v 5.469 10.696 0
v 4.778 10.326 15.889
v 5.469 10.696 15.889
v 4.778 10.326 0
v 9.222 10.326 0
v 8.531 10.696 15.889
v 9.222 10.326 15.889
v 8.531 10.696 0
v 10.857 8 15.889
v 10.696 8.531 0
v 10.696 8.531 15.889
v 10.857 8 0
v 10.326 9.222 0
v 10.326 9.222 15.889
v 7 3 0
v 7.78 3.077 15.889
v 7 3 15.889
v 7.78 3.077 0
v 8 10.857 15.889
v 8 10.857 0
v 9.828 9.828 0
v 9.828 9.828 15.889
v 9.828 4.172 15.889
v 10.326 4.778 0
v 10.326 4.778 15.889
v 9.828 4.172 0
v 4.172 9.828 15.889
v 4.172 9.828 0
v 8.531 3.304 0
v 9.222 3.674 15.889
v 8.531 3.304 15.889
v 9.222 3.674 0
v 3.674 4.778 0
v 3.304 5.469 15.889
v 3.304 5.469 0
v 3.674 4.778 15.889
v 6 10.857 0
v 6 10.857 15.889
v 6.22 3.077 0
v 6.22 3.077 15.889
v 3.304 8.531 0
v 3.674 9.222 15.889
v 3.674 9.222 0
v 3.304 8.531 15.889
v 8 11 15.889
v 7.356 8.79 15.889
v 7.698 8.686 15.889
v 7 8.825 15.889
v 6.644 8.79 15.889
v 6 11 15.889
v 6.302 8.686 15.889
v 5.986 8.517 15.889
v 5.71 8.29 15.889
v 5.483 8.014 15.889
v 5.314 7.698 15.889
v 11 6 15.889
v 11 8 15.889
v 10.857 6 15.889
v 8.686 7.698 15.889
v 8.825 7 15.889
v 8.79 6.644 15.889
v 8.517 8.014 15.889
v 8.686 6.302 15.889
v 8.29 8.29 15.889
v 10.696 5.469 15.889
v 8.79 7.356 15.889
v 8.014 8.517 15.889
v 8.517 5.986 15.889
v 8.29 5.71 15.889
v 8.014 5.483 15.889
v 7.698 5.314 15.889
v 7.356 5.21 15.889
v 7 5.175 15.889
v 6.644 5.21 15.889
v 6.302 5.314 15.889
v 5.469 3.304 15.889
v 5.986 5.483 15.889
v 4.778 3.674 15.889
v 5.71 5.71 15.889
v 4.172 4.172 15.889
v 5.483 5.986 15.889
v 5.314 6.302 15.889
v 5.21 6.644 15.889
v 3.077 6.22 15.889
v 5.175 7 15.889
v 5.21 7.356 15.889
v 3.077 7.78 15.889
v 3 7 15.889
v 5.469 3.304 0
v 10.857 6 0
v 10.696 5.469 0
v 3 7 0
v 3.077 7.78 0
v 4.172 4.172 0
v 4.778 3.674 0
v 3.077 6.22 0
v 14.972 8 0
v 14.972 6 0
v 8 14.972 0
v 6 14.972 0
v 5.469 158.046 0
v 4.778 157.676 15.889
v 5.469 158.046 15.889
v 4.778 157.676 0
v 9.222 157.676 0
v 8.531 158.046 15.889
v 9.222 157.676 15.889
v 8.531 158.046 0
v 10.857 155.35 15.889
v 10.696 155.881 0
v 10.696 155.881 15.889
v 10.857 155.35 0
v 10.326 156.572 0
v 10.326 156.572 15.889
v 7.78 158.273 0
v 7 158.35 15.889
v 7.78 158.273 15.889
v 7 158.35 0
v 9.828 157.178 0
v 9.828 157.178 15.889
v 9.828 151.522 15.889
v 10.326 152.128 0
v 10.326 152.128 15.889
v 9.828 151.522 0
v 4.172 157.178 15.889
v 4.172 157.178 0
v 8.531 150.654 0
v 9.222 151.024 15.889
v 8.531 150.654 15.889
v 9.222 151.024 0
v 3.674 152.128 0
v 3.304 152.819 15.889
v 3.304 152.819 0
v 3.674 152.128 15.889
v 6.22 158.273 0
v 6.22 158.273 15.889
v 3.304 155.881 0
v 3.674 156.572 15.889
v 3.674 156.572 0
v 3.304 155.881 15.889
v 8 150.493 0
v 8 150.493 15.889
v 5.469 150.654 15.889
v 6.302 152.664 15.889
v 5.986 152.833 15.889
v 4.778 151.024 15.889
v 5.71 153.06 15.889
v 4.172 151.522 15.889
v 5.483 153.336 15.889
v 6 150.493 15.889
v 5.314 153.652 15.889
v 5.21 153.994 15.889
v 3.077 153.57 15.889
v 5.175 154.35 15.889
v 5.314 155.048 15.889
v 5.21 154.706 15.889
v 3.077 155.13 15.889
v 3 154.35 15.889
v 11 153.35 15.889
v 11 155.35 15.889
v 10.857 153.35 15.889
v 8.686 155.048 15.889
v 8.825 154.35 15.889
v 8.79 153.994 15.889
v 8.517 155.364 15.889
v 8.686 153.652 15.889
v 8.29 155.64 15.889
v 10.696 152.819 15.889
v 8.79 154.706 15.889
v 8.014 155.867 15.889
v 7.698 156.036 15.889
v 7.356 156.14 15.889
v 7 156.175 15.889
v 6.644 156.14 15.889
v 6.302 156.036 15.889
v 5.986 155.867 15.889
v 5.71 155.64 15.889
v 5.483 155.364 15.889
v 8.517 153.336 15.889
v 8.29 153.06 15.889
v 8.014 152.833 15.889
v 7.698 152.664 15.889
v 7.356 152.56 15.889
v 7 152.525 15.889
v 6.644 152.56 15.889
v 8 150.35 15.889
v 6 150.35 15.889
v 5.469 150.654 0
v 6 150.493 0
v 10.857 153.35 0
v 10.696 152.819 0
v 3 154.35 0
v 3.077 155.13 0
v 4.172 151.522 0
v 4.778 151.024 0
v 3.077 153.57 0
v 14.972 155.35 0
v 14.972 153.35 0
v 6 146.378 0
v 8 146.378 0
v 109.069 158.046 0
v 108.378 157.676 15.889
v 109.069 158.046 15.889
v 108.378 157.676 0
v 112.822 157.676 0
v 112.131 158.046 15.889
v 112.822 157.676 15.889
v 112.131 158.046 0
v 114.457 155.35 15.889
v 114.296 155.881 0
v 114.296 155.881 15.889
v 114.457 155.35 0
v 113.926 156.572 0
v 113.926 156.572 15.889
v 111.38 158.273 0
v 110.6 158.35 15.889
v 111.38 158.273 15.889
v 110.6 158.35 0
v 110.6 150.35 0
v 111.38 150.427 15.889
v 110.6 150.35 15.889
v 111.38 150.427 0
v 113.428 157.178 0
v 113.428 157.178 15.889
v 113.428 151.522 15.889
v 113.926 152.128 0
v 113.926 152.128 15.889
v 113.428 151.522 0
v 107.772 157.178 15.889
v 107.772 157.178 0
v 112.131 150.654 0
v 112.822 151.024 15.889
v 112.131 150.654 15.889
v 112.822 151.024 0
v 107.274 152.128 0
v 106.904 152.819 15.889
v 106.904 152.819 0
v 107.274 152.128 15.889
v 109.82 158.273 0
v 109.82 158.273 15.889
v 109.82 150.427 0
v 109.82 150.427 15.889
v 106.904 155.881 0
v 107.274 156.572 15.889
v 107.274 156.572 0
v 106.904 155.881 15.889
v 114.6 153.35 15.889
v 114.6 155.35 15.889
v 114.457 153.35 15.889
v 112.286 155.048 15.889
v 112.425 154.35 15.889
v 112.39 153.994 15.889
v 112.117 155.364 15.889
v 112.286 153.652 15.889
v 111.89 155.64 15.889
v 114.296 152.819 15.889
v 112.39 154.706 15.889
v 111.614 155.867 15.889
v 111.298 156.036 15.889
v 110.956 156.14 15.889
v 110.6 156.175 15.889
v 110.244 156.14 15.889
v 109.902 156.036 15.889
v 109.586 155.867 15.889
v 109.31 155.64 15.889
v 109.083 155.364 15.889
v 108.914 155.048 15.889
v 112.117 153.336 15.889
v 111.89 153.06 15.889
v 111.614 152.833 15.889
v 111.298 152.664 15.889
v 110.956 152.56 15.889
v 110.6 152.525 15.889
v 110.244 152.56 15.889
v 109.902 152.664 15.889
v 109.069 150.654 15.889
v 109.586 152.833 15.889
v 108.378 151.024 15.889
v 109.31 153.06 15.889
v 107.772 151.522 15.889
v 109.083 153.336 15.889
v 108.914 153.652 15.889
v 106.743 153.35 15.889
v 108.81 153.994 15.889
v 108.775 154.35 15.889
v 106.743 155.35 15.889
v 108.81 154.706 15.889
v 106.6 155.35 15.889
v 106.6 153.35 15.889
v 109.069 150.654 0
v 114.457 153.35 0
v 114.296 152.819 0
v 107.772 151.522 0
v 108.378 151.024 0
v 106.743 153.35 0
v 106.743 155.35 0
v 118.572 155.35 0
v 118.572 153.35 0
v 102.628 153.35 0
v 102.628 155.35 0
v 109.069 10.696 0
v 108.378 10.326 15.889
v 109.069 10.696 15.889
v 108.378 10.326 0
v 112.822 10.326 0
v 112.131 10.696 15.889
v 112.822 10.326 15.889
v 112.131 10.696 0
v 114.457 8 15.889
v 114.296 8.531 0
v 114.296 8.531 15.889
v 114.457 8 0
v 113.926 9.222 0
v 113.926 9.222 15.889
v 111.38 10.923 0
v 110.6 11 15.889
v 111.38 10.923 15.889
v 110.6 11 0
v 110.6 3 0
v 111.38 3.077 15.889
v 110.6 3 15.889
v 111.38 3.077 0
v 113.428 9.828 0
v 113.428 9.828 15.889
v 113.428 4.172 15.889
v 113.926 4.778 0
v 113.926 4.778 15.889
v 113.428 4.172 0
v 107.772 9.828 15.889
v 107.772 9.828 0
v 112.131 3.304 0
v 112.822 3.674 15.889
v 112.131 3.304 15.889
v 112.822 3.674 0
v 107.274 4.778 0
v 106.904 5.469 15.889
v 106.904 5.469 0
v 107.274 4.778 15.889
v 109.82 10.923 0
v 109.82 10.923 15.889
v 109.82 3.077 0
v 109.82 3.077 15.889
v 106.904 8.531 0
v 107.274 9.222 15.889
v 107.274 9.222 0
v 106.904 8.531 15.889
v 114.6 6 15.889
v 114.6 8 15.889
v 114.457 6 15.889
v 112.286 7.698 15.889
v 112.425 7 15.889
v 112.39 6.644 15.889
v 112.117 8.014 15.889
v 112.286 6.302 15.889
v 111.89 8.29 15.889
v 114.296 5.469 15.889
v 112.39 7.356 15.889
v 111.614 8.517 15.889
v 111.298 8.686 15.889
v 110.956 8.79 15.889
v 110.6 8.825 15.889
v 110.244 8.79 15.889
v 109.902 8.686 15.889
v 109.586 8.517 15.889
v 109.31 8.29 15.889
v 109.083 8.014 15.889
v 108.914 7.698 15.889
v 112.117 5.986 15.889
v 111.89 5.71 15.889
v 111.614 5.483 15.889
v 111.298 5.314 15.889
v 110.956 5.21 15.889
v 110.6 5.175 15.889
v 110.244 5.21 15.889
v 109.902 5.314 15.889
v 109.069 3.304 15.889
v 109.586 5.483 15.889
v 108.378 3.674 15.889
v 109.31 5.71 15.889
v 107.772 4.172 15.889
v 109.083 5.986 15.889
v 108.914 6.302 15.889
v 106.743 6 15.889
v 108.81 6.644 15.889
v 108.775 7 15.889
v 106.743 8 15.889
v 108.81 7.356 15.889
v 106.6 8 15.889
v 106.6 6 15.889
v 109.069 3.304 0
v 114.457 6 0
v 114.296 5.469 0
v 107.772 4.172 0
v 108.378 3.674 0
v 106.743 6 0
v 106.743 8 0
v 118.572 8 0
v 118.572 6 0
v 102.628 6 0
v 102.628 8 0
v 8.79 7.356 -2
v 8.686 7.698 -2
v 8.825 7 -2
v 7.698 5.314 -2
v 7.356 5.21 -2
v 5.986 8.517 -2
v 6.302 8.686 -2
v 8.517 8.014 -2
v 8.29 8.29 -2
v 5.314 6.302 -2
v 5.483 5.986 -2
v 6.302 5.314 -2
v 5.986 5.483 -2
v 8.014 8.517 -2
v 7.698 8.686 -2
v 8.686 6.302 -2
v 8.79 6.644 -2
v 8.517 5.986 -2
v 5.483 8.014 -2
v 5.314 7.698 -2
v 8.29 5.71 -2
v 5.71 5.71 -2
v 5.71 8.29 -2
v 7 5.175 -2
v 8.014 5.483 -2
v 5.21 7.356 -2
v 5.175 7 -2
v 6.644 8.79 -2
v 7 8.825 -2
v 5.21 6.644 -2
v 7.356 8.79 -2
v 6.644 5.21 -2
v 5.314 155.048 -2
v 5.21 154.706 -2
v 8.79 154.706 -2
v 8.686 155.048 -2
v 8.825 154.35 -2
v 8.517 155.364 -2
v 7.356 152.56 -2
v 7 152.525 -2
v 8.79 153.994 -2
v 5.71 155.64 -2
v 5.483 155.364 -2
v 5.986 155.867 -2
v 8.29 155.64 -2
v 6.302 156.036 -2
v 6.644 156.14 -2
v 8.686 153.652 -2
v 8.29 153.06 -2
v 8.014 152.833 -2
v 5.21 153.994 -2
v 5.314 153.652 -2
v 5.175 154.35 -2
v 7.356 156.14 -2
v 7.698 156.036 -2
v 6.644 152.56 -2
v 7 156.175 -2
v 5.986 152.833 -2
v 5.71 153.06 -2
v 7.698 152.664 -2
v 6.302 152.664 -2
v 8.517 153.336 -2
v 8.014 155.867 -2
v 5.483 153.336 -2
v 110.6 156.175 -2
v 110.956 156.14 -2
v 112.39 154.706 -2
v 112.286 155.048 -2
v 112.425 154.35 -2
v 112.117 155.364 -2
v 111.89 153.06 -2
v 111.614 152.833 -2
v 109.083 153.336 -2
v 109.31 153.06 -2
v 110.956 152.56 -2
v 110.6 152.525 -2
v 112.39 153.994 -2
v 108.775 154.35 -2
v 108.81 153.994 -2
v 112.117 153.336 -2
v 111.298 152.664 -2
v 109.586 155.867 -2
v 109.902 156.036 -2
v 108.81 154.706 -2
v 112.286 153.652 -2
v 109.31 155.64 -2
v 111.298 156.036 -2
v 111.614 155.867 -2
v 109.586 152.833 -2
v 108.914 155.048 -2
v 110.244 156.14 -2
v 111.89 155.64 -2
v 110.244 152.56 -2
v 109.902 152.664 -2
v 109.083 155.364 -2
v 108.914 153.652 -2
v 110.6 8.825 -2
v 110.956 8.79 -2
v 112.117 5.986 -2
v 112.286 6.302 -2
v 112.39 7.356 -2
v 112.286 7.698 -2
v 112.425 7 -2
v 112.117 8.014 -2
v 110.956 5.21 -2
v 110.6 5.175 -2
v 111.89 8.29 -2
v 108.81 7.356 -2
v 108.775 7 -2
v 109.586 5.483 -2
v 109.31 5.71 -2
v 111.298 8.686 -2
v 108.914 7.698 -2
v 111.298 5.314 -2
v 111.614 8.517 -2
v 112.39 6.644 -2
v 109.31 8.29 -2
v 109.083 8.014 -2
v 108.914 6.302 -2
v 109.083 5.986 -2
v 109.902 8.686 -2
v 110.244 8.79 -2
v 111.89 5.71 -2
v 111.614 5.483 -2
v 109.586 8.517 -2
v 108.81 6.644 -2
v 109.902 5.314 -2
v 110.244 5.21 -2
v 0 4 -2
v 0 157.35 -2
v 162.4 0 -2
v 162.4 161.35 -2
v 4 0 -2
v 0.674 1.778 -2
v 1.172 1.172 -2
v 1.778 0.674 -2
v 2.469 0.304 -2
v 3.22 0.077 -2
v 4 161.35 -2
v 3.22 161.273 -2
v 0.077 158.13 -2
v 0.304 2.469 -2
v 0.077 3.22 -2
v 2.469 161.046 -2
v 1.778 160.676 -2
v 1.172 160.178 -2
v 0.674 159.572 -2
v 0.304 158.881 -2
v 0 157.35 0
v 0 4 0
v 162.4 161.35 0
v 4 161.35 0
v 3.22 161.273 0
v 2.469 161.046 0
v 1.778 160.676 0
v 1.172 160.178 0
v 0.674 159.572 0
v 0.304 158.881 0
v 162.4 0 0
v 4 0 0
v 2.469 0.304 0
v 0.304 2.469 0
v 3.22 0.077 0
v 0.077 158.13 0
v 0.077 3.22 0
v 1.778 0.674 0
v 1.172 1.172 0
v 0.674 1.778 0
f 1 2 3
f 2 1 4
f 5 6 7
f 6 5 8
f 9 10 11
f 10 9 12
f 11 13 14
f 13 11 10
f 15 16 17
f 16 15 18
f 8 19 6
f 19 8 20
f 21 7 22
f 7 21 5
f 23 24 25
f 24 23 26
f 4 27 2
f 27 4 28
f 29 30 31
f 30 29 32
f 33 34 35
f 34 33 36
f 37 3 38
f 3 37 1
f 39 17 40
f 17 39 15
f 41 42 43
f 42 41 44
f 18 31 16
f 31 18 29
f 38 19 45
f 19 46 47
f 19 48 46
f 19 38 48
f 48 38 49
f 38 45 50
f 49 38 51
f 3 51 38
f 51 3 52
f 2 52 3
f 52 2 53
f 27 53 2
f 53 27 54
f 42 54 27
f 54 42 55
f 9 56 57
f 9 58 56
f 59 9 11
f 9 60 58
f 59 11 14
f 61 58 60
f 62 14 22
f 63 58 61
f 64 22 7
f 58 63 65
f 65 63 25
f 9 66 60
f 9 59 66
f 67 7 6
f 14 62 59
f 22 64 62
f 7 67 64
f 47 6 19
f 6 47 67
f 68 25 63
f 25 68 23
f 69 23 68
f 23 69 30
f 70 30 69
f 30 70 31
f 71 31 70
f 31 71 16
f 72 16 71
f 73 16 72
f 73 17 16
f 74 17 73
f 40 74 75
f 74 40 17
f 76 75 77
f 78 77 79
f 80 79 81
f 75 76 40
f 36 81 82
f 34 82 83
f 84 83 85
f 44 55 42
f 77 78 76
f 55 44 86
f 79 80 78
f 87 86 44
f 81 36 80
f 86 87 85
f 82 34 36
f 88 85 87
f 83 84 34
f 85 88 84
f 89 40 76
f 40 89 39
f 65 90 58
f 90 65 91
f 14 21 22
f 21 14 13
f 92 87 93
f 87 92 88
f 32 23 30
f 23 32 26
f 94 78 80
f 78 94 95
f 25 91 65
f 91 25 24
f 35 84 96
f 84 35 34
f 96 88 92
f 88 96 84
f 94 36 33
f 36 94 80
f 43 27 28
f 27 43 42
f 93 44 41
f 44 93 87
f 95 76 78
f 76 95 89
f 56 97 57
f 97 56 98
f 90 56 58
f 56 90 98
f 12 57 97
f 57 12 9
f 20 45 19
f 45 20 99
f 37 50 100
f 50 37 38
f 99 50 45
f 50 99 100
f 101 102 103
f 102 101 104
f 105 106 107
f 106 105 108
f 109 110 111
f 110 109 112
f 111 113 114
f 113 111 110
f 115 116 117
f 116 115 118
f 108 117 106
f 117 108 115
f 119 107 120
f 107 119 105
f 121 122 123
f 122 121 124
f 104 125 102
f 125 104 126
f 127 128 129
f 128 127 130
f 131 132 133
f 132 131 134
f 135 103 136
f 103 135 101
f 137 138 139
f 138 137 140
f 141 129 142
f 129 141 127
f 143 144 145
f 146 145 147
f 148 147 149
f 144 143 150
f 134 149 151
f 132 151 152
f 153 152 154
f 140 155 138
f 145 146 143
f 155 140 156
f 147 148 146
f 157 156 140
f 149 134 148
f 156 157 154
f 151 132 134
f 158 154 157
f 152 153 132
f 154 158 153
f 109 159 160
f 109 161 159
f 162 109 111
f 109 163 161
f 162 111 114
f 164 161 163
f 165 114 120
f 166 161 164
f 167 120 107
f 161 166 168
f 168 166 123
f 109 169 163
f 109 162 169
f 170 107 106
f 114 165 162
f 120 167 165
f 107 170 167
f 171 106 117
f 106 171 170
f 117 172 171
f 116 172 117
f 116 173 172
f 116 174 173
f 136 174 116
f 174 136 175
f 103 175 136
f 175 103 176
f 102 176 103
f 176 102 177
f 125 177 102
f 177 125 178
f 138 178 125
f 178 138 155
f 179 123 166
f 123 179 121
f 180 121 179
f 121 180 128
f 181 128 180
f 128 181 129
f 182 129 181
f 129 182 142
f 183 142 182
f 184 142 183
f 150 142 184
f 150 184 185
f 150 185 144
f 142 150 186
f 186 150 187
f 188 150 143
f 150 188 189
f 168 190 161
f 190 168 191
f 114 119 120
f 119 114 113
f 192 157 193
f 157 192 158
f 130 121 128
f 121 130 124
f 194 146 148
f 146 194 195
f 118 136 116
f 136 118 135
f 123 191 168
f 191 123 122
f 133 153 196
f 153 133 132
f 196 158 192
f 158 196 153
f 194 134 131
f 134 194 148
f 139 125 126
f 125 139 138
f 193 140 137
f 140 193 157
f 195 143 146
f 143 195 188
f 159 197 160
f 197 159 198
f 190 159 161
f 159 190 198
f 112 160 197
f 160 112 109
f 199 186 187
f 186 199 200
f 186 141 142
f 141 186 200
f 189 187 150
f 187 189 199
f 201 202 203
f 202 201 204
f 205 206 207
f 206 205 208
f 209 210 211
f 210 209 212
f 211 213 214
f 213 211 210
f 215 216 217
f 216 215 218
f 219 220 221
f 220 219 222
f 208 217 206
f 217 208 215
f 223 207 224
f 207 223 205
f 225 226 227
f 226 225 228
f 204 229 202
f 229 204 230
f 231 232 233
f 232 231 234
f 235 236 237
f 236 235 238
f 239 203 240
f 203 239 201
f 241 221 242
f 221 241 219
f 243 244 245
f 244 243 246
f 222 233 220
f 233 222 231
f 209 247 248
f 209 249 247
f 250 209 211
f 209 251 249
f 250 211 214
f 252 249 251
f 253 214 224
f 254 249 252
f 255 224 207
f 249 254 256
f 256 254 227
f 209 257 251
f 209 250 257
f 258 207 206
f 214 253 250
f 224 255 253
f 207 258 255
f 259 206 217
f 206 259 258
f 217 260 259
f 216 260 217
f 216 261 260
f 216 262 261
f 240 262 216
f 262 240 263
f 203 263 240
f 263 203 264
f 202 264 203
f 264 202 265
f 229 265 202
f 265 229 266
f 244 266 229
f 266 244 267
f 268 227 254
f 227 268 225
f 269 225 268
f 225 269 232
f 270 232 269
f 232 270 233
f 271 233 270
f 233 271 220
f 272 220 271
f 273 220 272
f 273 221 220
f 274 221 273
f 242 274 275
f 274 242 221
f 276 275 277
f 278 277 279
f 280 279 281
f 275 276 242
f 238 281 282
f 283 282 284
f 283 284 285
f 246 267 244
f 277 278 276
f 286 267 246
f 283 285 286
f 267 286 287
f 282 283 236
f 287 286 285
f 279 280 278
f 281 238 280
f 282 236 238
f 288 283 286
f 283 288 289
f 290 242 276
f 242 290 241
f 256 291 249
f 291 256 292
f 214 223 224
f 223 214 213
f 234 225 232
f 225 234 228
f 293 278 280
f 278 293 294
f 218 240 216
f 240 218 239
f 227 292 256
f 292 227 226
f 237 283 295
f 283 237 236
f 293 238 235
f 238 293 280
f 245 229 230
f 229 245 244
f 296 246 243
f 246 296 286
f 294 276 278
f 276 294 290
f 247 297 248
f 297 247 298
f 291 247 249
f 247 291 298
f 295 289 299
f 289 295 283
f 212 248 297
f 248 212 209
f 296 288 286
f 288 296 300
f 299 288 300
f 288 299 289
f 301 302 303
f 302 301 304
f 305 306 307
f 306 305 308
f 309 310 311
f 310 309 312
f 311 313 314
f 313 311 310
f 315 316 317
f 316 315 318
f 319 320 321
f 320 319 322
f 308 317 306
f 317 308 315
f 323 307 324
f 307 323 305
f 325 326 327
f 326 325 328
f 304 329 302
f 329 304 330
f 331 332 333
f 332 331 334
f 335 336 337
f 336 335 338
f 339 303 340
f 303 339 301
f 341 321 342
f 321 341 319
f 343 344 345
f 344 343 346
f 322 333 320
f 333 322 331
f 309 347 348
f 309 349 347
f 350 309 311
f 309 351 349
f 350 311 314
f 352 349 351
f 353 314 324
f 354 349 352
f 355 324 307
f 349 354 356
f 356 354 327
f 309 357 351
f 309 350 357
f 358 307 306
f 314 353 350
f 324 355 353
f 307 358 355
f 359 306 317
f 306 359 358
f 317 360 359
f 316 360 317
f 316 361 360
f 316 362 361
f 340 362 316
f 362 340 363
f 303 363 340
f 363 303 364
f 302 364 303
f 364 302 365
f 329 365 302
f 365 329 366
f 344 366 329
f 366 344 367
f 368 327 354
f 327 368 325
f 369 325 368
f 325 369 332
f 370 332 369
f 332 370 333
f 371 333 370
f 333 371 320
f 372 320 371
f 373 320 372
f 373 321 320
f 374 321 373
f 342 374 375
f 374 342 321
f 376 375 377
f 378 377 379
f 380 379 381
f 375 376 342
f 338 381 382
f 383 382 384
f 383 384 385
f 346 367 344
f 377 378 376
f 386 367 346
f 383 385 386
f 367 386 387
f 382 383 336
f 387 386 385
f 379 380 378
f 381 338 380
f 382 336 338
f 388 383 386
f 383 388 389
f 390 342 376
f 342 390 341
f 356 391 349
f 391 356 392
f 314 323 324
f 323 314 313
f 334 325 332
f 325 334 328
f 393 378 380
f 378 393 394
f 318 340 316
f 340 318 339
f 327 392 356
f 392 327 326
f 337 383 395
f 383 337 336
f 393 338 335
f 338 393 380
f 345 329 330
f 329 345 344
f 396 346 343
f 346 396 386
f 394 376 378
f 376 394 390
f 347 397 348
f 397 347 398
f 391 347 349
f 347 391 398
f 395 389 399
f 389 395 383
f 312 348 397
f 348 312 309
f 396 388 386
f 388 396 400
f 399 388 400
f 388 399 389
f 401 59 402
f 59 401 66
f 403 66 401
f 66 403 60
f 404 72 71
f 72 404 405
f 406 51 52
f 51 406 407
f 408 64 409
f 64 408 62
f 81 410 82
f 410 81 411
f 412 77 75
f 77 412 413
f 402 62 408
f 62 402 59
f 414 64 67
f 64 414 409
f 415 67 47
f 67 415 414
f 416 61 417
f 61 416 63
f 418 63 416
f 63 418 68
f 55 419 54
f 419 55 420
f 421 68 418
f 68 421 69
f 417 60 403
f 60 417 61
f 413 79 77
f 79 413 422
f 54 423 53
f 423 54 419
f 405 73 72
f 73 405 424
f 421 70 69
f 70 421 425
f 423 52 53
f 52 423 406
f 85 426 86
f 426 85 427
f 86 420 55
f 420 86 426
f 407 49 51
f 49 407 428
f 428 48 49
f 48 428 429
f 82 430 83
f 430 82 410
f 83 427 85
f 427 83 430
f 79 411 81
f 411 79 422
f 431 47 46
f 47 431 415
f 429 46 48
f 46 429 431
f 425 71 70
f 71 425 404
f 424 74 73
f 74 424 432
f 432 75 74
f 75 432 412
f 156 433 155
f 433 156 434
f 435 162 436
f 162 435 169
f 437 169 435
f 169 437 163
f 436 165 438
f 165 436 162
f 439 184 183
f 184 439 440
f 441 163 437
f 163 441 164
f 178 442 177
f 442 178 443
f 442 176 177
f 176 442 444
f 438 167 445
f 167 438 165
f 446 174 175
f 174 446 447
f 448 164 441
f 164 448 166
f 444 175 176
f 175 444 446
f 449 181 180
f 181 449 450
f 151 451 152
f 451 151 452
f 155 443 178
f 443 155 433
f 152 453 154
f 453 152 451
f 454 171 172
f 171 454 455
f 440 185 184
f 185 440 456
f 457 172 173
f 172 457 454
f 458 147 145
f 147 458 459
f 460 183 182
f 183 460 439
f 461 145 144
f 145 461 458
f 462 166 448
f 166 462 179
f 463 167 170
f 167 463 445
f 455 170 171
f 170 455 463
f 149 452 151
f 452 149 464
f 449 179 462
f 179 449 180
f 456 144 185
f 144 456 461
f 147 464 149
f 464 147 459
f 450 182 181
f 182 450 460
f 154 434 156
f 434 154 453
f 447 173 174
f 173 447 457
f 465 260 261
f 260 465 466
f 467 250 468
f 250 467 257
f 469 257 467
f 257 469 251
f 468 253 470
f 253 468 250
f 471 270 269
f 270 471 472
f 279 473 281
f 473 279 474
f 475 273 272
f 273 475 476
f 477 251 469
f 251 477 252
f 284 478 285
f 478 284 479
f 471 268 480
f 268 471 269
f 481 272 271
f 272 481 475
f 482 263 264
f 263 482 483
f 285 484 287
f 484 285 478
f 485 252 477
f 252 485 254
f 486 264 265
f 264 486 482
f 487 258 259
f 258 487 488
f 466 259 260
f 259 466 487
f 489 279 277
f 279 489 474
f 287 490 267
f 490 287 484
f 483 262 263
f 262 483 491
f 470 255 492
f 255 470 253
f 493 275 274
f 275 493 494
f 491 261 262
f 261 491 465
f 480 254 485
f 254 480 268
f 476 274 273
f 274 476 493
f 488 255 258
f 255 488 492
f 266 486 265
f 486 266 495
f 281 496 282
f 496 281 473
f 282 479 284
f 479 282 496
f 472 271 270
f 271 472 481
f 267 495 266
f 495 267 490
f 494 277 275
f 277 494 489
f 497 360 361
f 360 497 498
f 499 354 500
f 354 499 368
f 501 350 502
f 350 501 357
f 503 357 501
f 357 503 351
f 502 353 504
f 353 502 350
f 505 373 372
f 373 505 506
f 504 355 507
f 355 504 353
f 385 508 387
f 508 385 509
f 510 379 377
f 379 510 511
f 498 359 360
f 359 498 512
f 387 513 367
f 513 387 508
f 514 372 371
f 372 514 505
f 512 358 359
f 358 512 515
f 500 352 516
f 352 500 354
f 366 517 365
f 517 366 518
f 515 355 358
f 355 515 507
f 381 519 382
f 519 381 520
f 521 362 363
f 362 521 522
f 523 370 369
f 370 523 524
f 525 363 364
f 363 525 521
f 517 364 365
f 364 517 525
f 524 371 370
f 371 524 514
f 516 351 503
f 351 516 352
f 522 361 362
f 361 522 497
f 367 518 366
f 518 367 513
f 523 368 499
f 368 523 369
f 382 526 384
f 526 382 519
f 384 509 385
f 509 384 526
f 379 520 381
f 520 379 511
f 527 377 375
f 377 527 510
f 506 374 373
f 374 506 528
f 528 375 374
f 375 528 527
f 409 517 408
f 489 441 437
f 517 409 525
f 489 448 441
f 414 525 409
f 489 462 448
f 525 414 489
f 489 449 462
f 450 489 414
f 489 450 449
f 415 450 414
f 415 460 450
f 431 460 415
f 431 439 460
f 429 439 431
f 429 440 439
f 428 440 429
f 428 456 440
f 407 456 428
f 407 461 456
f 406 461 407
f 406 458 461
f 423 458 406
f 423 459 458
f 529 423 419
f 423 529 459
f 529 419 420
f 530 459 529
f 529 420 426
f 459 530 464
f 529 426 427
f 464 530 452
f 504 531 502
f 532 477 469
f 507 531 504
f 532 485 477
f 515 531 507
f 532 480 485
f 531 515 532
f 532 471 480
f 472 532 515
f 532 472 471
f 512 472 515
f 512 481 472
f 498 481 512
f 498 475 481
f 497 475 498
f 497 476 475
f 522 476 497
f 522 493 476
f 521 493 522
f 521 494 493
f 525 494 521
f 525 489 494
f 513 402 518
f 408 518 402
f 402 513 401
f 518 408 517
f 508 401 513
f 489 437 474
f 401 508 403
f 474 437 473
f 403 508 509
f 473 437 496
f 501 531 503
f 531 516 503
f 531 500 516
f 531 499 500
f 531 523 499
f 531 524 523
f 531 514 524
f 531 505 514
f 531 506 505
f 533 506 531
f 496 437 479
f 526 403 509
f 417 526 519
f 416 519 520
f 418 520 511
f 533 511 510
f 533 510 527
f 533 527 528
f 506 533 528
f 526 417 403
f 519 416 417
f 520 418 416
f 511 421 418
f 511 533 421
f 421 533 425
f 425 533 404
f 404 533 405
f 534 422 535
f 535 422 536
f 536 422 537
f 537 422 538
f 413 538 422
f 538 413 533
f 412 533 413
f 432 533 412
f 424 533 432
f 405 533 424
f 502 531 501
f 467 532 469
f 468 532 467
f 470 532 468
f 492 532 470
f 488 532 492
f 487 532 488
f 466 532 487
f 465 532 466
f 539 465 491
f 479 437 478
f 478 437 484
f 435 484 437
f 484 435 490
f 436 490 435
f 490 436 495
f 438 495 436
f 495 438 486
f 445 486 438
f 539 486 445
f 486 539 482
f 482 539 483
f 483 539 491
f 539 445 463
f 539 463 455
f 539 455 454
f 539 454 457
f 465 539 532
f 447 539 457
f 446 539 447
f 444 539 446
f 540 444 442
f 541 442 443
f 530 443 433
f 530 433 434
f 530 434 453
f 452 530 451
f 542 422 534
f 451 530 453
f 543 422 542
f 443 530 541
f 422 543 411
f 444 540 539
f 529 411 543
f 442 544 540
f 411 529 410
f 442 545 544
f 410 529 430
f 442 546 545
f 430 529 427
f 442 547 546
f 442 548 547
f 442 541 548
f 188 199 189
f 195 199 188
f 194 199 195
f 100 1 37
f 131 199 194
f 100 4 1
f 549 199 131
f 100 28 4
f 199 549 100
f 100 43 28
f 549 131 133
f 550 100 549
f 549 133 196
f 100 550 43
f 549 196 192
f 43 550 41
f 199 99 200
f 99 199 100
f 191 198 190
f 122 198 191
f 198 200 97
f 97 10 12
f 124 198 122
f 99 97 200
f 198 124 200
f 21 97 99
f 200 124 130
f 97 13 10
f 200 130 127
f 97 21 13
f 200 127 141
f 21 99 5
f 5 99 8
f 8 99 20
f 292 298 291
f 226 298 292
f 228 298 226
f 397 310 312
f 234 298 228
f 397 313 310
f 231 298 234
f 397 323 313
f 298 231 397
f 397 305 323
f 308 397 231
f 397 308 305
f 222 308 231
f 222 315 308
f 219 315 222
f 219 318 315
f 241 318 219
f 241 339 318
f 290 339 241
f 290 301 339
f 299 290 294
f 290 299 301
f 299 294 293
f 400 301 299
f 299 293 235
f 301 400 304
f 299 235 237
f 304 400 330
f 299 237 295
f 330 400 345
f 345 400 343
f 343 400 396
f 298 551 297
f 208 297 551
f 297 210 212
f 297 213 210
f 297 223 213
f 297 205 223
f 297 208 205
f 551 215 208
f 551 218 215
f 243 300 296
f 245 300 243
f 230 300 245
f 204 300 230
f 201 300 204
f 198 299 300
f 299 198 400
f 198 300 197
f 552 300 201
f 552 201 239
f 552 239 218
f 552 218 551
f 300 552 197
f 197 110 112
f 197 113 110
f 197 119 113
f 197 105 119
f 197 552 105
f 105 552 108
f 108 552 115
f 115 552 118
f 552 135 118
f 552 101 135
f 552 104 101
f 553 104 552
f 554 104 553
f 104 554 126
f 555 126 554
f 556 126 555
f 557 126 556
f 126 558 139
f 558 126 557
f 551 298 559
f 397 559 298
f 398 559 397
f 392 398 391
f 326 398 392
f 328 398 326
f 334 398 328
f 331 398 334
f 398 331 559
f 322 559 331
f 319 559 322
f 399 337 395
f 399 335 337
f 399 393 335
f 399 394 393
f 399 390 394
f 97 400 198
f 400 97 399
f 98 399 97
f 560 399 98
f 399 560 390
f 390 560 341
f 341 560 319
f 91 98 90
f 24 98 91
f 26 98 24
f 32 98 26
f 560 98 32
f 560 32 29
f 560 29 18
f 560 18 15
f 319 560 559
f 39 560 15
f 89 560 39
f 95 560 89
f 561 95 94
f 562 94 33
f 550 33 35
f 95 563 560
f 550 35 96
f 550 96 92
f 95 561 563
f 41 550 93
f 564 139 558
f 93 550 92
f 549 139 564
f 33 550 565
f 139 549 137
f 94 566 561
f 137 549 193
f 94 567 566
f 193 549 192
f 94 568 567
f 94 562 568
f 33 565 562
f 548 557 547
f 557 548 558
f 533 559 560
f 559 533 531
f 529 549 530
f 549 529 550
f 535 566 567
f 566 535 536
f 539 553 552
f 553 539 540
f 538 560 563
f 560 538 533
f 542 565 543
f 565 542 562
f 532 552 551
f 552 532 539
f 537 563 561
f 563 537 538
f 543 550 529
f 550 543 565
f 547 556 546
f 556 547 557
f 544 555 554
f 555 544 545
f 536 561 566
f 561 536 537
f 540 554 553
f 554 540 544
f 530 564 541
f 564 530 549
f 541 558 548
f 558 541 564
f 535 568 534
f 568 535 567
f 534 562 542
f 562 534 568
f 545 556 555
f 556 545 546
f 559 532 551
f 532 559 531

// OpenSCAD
// Generated by SolidPython 1.1.3 on 2024-04-18 16:18:07
$fn = 32;


difference() {
	intersection() {
		union() {
			difference() {
				translate(v = [0, 0, 16.4445000000]) {
					translate(v = [0, 147.3500000000, 0]) {
						translate(v = [10, 0, 0]) {
							difference() {
								translate(v = [-3, 0, 0]) {
									translate(v = [0, -140.3500000000, 0]) {
										translate(v = [0, 0, -69.5555000000]) {
											union() {
												translate(v = [0, 0, 0]) {
													translate(v = [0, 0, 0]) {
														union() {
															cylinder(h = 69, r = 4.0000000000);
															rotate(a = 90, v = [1, 0, 0]) {
																linear_extrude(center = true, height = 2) {
																	polygon(paths = [[0, 1, 2, 3]], points = [[0, 0], [0, 69], [4.0000000000, 69], [21.2500000000, 0]]);
																}
															}
															rotate(a = 90, v = [0, 0, 1]) {
																rotate(a = 90, v = [1, 0, 0]) {
																	linear_extrude(center = true, height = 2) {
																		polygon(paths = [[0, 1, 2, 3]], points = [[0, 0], [0, 69], [4.0000000000, 69], [21.2500000000, 0]]);
																	}
																}
															}
														}
													}
												}
												translate(v = [0, 0, 0]) {
													translate(v = [0, 147.3500000000, 0]) {
														union() {
															cylinder(h = 69, r = 4.0000000000);
															rotate(a = 90, v = [1, 0, 0]) {
																linear_extrude(center = true, height = 2) {
																	polygon(paths = [[0, 1, 2, 3]], points = [[0, 0], [0, 69], [4.0000000000, 69], [21.2500000000, 0]]);
																}
															}
															rotate(a = 270, v = [0, 0, 1]) {
																rotate(a = 90, v = [1, 0, 0]) {
																	linear_extrude(center = true, height = 2) {
																		polygon(paths = [[0, 1, 2, 3]], points = [[0, 0], [0, 69], [4.0000000000, 69], [21.2500000000, 0]]);
																	}
																}
															}
														}
													}
												}
												translate(v = [310.8000000000, 0, 0]) {
													translate(v = [0, 147.3500000000, 0]) {
														union() {
															cylinder(h = 69, r = 4.0000000000);
															rotate(a = 180, v = [0, 0, 1]) {
																rotate(a = 90, v = [1, 0, 0]) {
																	linear_extrude(center = true, height = 2) {
																		polygon(paths = [[0, 1, 2, 3]], points = [[0, 0], [0, 69], [4.0000000000, 69], [21.2500000000, 0]]);
																	}
																}
															}
															rotate(a = 270, v = [0, 0, 1]) {
																rotate(a = 90, v = [1, 0, 0]) {
																	linear_extrude(center = true, height = 2) {
																		polygon(paths = [[0, 1, 2, 3]], points = [[0, 0], [0, 69], [4.0000000000, 69], [21.2500000000, 0]]);
																	}
																}
															}
														}
													}
												}
												translate(v = [310.8000000000, 0, 0]) {
													translate(v = [0, 0, 0]) {
														union() {
															cylinder(h = 69, r = 4.0000000000);
															rotate(a = 180, v = [0, 0, 1]) {
																rotate(a = 90, v = [1, 0, 0]) {
																	linear_extrude(center = true, height = 2) {
																		polygon(paths = [[0, 1, 2, 3]], points = [[0, 0], [0, 69], [4.0000000000, 69], [21.2500000000, 0]]);
																	}
																}
															}
															rotate(a = 90, v = [0, 0, 1]) {
																rotate(a = 90, v = [1, 0, 0]) {
																	linear_extrude(center = true, height = 2) {
																		polygon(paths = [[0, 1, 2, 3]], points = [[0, 0], [0, 69], [4.0000000000, 69], [21.2500000000, 0]]);
																	}
																}
															}
														}
													}
												}
												translate(v = [103.6000000000, 0, 0]) {
													translate(v = [0, 147.3500000000, 0]) {
														union() {
															cylinder(h = 69, r = 4.0000000000);
															rotate(a = 90, v = [1, 0, 0]) {
																linear_extrude(center = true, height = 2) {
																	polygon(paths = [[0, 1, 2, 3]], points = [[0, 0], [0, 69], [4.0000000000, 69], [21.2500000000, 0]]);
																}
															}
															rotate(a = 180, v = [0, 0, 1]) {
																rotate(a = 90, v = [1, 0, 0]) {
																	linear_extrude(center = true, height = 2) {
																		polygon(paths = [[0, 1, 2, 3]], points = [[0, 0], [0, 69], [4.0000000000, 69], [21.2500000000, 0]]);
																	}
																}
															}
														}
													}
												}
												translate(v = [103.6000000000, 0, 0]) {
													translate(v = [0, 0, 0]) {
														union() {
															cylinder(h = 69, r = 4.0000000000);
															rotate(a = 90, v = [1, 0, 0]) {
																linear_extrude(center = true, height = 2) {
																	polygon(paths = [[0, 1, 2, 3]], points = [[0, 0], [0, 69], [4.0000000000, 69], [21.2500000000, 0]]);
																}
															}
															rotate(a = 180, v = [0, 0, 1]) {
																rotate(a = 90, v = [1, 0, 0]) {
																	linear_extrude(center = true, height = 2) {
																		polygon(paths = [[0, 1, 2, 3]], points = [[0, 0], [0, 69], [4.0000000000, 69], [21.2500000000, 0]]);
																	}
																}
															}
														}
													}
												}
												translate(v = [207.2000000000, 0, 0]) {
													translate(v = [0, 147.3500000000, 0]) {
														union() {
															cylinder(h = 69, r = 4.0000000000);
															rotate(a = 90, v = [1, 0, 0]) {
																linear_extrude(center = true, height = 2) {
																	polygon(paths = [[0, 1, 2, 3]], points = [[0, 0], [0, 69], [4.0000000000, 69], [21.2500000000, 0]]);
																}
															}
															rotate(a = 180, v = [0, 0, 1]) {
																rotate(a = 90, v = [1, 0, 0]) {
																	linear_extrude(center = true, height = 2) {
																		polygon(paths = [[0, 1, 2, 3]], points = [[0, 0], [0, 69], [4.0000000000, 69], [21.2500000000, 0]]);
																	}
																}
															}
														}
													}
												}
												translate(v = [207.2000000000, 0, 0]) {
													translate(v = [0, 0, 0]) {
														union() {
															cylinder(h = 69, r = 4.0000000000);
															rotate(a = 90, v = [1, 0, 0]) {
																linear_extrude(center = true, height = 2) {
																	polygon(paths = [[0, 1, 2, 3]], points = [[0, 0], [0, 69], [4.0000000000, 69], [21.2500000000, 0]]);
																}
															}
															rotate(a = 180, v = [0, 0, 1]) {
																rotate(a = 90, v = [1, 0, 0]) {
																	linear_extrude(center = true, height = 2) {
																		polygon(paths = [[0, 1, 2, 3]], points = [[0, 0], [0, 69], [4.0000000000, 69], [21.2500000000, 0]]);
																	}
																}
															}
														}
													}
												}
											}
										}
									}
								}
								translate(v = [-3, 0, 0]) {
									translate(v = [0, -140.3500000000, 0]) {
										union() {
											translate(v = [0, 0, 0]) {
												translate(v = [0, 0, 0]) {
													cylinder(center = true, h = 276, r = 1.8250000000);
												}
											}
											translate(v = [0, 0, 0]) {
												translate(v = [0, 147.3500000000, 0]) {
													cylinder(center = true, h = 276, r = 1.8250000000);
												}
											}
											translate(v = [310.8000000000, 0, 0]) {
												translate(v = [0, 147.3500000000, 0]) {
													cylinder(center = true, h = 276, r = 1.8250000000);
												}
											}
											translate(v = [310.8000000000, 0, 0]) {
												translate(v = [0, 0, 0]) {
													cylinder(center = true, h = 276, r = 1.8250000000);
												}
											}
											translate(v = [103.6000000000, 0, 0]) {
												translate(v = [0, 147.3500000000, 0]) {
													cylinder(center = true, h = 276, r = 1.8250000000);
												}
											}
											translate(v = [103.6000000000, 0, 0]) {
												translate(v = [0, 0, 0]) {
													cylinder(center = true, h = 276, r = 1.8250000000);
												}
											}
											translate(v = [207.2000000000, 0, 0]) {
												translate(v = [0, 147.3500000000, 0]) {
													cylinder(center = true, h = 276, r = 1.8250000000);
												}
											}
											translate(v = [207.2000000000, 0, 0]) {
												translate(v = [0, 0, 0]) {
													cylinder(center = true, h = 276, r = 1.8250000000);
												}
											}
										}
									}
								}
							}
						}
					}
				}
				translate(v = [0, 0, -2]) {
					translate(v = [0, 0, -100]) {
						translate(v = [0, -80.6750000000, 0]) {
							translate(v = [-162.4000000000, 0, 0]) {
								cube(size = [649.6000000000, 322.7000000000, 100]);
							}
						}
					}
				}
			}
			intersection() {
				translate(v = [0, 0, -2]) {
					translate(v = [-162.4000000000, 0, 0]) {
						translate(v = [0, -80.6750000000, 0]) {
							cube(size = [649.6000000000, 322.7000000000, 2]);
						}
					}
				}
				translate(v = [0, 0, 16.4445000000]) {
					translate(v = [0, 147.3500000000, 0]) {
						translate(v = [10, 0, 0]) {
							translate(v = [0, 0, -34.5000000000]) {
								translate(v = [152.4000000000, 0, 0]) {
									translate(v = [0, -66.6750000000, 0]) {
										minkowski() {
											cube(center = true, size = [316.8000000000, 153.3500000000, 69]);
											cylinder(center = true, h = 0.5555000000, r = 4);
										}
									}
								}
							}
						}
					}
				}
			}
		}
		translate(v = [0, 0, 16.4445000000]) {
			translate(v = [0, 147.3500000000, 0]) {
				translate(v = [10, 0, 0]) {
					translate(v = [-10.0000000000, 0, 0]) {
						translate(v = [0, -242.0250000000, 0]) {
							translate(v = [0, 0, -34.5000000000]) {
								cube(size = [162.4000000000, 322.7000000000, 138]);
							}
						}
					}
				}
			}
		}
	}
	translate(v = [0, 0, 16.4445000000]) {
		translate(v = [0, 147.3500000000, 0]) {
			translate(v = [10, 0, 0]) {
				translate(v = [-3, 0, 0]) {
					translate(v = [0, -140.3500000000, 0]) {
						union() {
							translate(v = [0, 0, 0]) {
								translate(v = [0, 0, 0]) {
									cylinder(center = true, h = 276, r = 1.8250000000);
								}
							}
							translate(v = [0, 0, 0]) {
								translate(v = [0, 147.3500000000, 0]) {
									cylinder(center = true, h = 276, r = 1.8250000000);
								}
							}
							translate(v = [310.8000000000, 0, 0]) {
								translate(v = [0, 147.3500000000, 0]) {
									cylinder(center = true, h = 276, r = 1.8250000000);
								}
							}
							translate(v = [310.8000000000, 0, 0]) {
								translate(v = [0, 0, 0]) {
									cylinder(center = true, h = 276, r = 1.8250000000);
								}
							}
							translate(v = [103.6000000000, 0, 0]) {
								translate(v = [0, 147.3500000000, 0]) {
									cylinder(center = true, h = 276, r = 1.8250000000);
								}
							}
							translate(v = [103.6000000000, 0, 0]) {
								translate(v = [0, 0, 0]) {
									cylinder(center = true, h = 276, r = 1.8250000000);
								}
							}
							translate(v = [207.2000000000, 0, 0]) {
								translate(v = [0, 147.3500000000, 0]) {
									cylinder(center = true, h = 276, r = 1.8250000000);
								}
							}
							translate(v = [207.2000000000, 0, 0]) {
								translate(v = [0, 0, 0]) {
									cylinder(center = true, h = 276, r = 1.8250000000);
								}
							}
						}
					}
				}
			}
		}
	}
}
/***********************************************
*********      SolidPython code:      **********
************************************************
 
#!/usr/bin/env python3

import argparse
from asyncio import subprocess
import json
# import math
import re
import logging
import os
# import os.path
import subprocess
# import time

from solid import *
from solid.utils import *

from parameters import Parameters
from keyboard import Keyboard
from cable import Cable

# Set logger level variables
console_logging_level = logging.WARN
file_logging_level = logging.DEBUG


# Get root logger and set main logger level to DEBUG
logger = logging.getLogger()
logger.setLevel(logging.DEBUG)


# Create formatters
console_formatter = logging.Formatter('%(name)s %(levelname)s: %(funcName)s: [%(lineno)d]: %(message)s')
file_formatter = logging.Formatter('%(asctime)s %(levelname)s %(name)s: %(funcName)s: [%(lineno)d]: %(message)s')

# Create console handler and set level to info
console_handler = logging.StreamHandler()
console_handler.setLevel(console_logging_level)

# Add formatter to console_handler
console_handler.setFormatter(console_formatter)

# Add console handler to logger
logger.addHandler(console_handler)

# Get file info that will be used to creat log file
script_location = Path(os.path.dirname(os.path.realpath(__file__)))
log_file_name = 'generator.log'
log_file_path = script_location / log_file_name

# Create file handler and set level to info
file_handler = logging.FileHandler(log_file_path, mode = 'w')
file_handler.setLevel(file_logging_level)

# Add formatter to file_handler
file_handler.setFormatter(file_formatter)

# Add file handler to logger
logger.addHandler(file_handler)


# Helper for parser to wnsure filename argument has to correct extension
def CheckExt(choices):
    class Act(argparse.Action):
        def __call__(self,parser,namespace,fname,option_string=None):
            ext = os.path.splitext(fname)[1][1:]
            if ext not in choices:
                option_string = '({})'.format(option_string) if option_string else ''
                parser.error("file doesn't end with one of {}{}".format(choices,option_string))
            else:
                setattr(namespace,self.dest,fname)

    return Act



def main():

    parser = argparse.ArgumentParser(description='Build custom keyboard SCAD file using keyboard layout editor format')
    parser.add_argument('-i', '--input-file', metavar = 'layout_json_file_name.json', help = 'A path to a keyboard layout editor json file', required = True, action=CheckExt({'json'}))
    # parser.add_argument('-o', '--output-folder', metavar = 'scad', help = 'A path to a folder to store the generated open scad file')
    parser.add_argument('-p', '--parameter-file', metavar = 'parameters.json', help = 'A JSON file containing paramters for the object buing made', default = None, action=CheckExt({'json'}))
    parser.add_argument('-s', '--section', metavar = 'section_num', help = 'The number of the section that should be built', type = int, default = -1)
    parser.add_argument('-a', '--all-sections', help = 'Output all the parts for all possible sections in separate files', default = False, action = 'store_true')
    parser.add_argument('-e', '--exploded', help = 'Create test file with each section shown as an exploded view', default = False, action = 'store_true')
    parser.add_argument('-f', '--fragments', metavar = 'num_fragments', help = 'The number of fragments to be used when creating curves', type = int, default = 8)
    parser.add_argument('-r', '--render', help = 'Render an STL from the generated scad file', default = False, action = 'store_true')
    parser.add_argument('--switch-type-in-filename', help = 'Add the switch type name and stabilizer type name to the filname', default = False, action = 'store_true')

    # Parse command line arguments
    args = parser.parse_args()
    logger.debug(vars(args))

    # Create Path object from input file argument
    input_file_path = Path(args.input_file)

    # Get base folder path
    base_path = input_file_path.parent

    # Get input file name onle
    file_name_only = input_file_path.name
    
    # Get layout name from file name
    layout_name = input_file_path.stem

    # Generate output scad and stl output folder paths
    output_base_folder = base_path / layout_name
    scad_folder_path = output_base_folder / 'scad'
    stl_folder_path = output_base_folder / 'stl'

    # Ensure all outpur folders exists
    if output_base_folder.is_dir() == False:
        output_base_folder.mkdir()

    if scad_folder_path.is_dir() == False:
        scad_folder_path.mkdir()

    if stl_folder_path.is_dir() == False:
        stl_folder_path.mkdir()

    logger.debug('layout_name: %s', str(layout_name))
    logger.debug('base_path: %s', str(base_path))
    logger.debug('file_name_only: %s', str(file_name_only))
    
    # define output file extensions
    scad_postfix = '.scad'
    stl_postfix  = '.stl'

    # Set fragments per circle
    FRAGMENTS = args.fragments
    logger.debug('\tFragments: %d', FRAGMENTS)

    # Pattern and Replacement strings to be used when trying to turn keyboard-layout-editor raw output into valid JSON
    json_key_pattern = '([{,])([xywha1]+):'
    json_key_replace = '\\1"\\2":'

    # Open JSON layout file
    logger.debug('Open layout file %s', input_file_path)
    try:
        # Try with utf-8 encoding specified
        f = open(input_file_path, encoding="utf-8")
    except:
        # Failed to open
        logger.info('Failed to open layout file with utf-8 encoding specified. Try opening without specifying an encoding')
        try:
            # Try opening with no encoding spcificed
            f = open(input_file_path)
        except:
            logger.error('Failed to open layout file both spefifying utf-8 andcoding and not specifying any encodeing. Exiting')
            exit(1)

    logger.debug('Read layout JSON string from file %s', input_file_path)
    try:
        keyboard_layout = f.read()
    except UnicodeDecodeError:
        logger.error('Unable to decode layout file. Please provide utf-8 encoded files')
        exit(-1)

    keyboard_layout_dict = None

    # Load keyboard layout dictionary
    logger.debug('Parse layout file JSON string')
    try:
        # Attempt to parse to provided JSON string
        keyboard_layout_dict = json.loads(keyboard_layout)
        logger.debug('Valid Json Parsed')
    except:
        # Failed to parse the JSON test.
        # This most likely means that the keybaord-layout-editor raw output was provided
        # Attempt to modify that string to make it valid JSON
        keyboard_layout = '[%s]' % (keyboard_layout)
        keyboard_layout = re.sub(json_key_pattern, json_key_replace, keyboard_layout)
        try:
            keyboard_layout_dict = json.loads(keyboard_layout)
            logger.info('Initial layout Json Invalid. Json modified and parsed')
        except:
            logger.error('Failed to parse layout json after attempt at correction.')
            raise

    logger.debug('keyboard_layout_dict: %s', str(keyboard_layout_dict))


    # Read parameter file
    parameter_dict = None
    if args.parameter_file is not None:
        # Open JSON parameter file
        logger.debug('Open parameter file %s', args.parameter_file)
        try:
            # Try with utf-8 encoding specified
            f = open(args.parameter_file, encoding="utf-8")
        except:
            # Failed to open
            logger.info('Failed to open parameter file with utf-8 encoding specified. Try opening without specifying an encoding')
            try:
                # Try opening with no encoding spcificed
                f = open(args.parameter_fil)
            except:
                logger.error('Failed to open parameter file both spefifying utf-8 andcoding and not specifying any encodeing. Exiting')
                exit(1)
        

        logger.debug('Read JSON string from parameter file %s', args.parameter_file)
        try:
             parameter_file_text = f.read()
        except UnicodeDecodeError:
            logger.error('Unable to decode parameter file. Please provide utf-8 encoded files')
            exit(-1)
       
        logger.debug('Parse parameter JSON string')
        try:
            parameter_dict = json.loads(parameter_file_text)
            logger.debug('Valid Json Parsed')
        except:
            logger.error('Failed to parse parameter JSON file.')
            raise

        logger.debug('parameter_dict: %s', str(parameter_dict))


    # Set parameters from imput file
    parameters = Parameters(parameter_dict)
    
    # Create Keyboard instance
    keyboard = Keyboard(parameters)

    # Process the keyboard layout object
    keyboard.process_keyboard_layout(keyboard_layout_dict)
    keyboard.process_custom_shapes()

    logger.debug('kerf: %f', keyboard.kerf)

    # Dictionary of SolidPython solid objects that need to be rendered to SCAD and to STL if desired
    solid_object_dict = {}

    # Create objects for each of the generated sections
    if args.all_sections == True:
        # Iterate over all sections generated and add all sections to solid_object_dict
        for section in range(keyboard.get_top_section_count()):
            # Set current section for generator
            keyboard.set_section(section)

            # Create dict for section
            solid_object_dict[section] = {}

            # Add top assembly, plate, and all assembly to section dict
            solid_object_dict[section]['top'] = keyboard.get_assembly(top = True)
            solid_object_dict[section]['all'] = keyboard.get_assembly(all = True)
            solid_object_dict[section]['plate'] = keyboard.get_assembly(plate_only = True)

            # If there is a bottom section for the current section add it to section dict
            if section < keyboard.get_bottom_section_count():
                solid_object_dict[section]['bottom'] = keyboard.get_assembly(bottom = True)
            
    # Create exploded object
    elif args.exploded == True:
        solid_object_dict[-1] = {}
        solid_object_dict[-1]['top'] = union()
        solid_object_dict[-1]['plate'] = union()
        solid_object_dict[-1]['bottom'] = union()
        for section in range(keyboard.get_top_section_count()):
            keyboard.set_section(section)
            solid_object_dict[-1]['top'] += up(5 * section) ( right(10 * section) ( keyboard.get_assembly(top = True) ) )
            solid_object_dict[-1]['plate'] += up(5 * section) ( right(10 * section) ( keyboard.get_assembly(plate_only = True) ) )
            if section < keyboard.get_bottom_section_count():
                solid_object_dict[-1]['bottom'] += up(5 * section) ( right(10 * section) ( keyboard.get_assembly(bottom = True) ) )
    

    # Create objects for a specified section
    elif args.section > -1:
        # Set desired section to create
        keyboard.set_section(args.section)

        # Create dict for section
        solid_object_dict[args.section] = {}

        # Add top assembly, plate, and all assembly to section dict
        solid_object_dict[args.section]['top'] = keyboard.get_assembly(top = True)
        solid_object_dict[args.section]['all'] = keyboard.get_assembly(all = True)
        solid_object_dict[args.section]['plate'] = keyboard.get_assembly(plate_only = True)

        # If there is a bottom section for the current section add it to section dict
        if args.section < keyboard.get_bottom_section_count():
            solid_object_dict[args.section]['bottom'] = keyboard.get_assembly(bottom = True)

    # Create an objects that are not split into sections. No other options were specified
    else:
        logger.debug('Create whole object. No other options specified')
        solid_object_dict['all'] = {}
        solid_object_dict['all']['top'] = keyboard.get_assembly(top = True)
        solid_object_dict['all']['bottom'] = keyboard.get_assembly(bottom = True)
        solid_object_dict['all']['all'] = keyboard.get_assembly(all = True)
        solid_object_dict['all']['plate'] = keyboard.get_assembly(plate_only = True)
    
    # Add global items that are not dependant on the sctions or parts of the item to build
    solid_object_dict['global'] = {}

    # Generate a strain relief piece for the cable hole
    if parameters.cable_hole == True:
        cable = Cable(parameters)
        solid_object_dict['global']['cable_holder_main'] = cable.holder_main()
        solid_object_dict['global']['cable_holder_clamp'] = cable.holder_clamp()
        solid_object_dict['global']['cable_holder_all'] = cable.holder_all()

    print(parameters)
    print('Case Height: %f, Case Width: %f\n' % (parameters.real_case_height, parameters.real_case_width))
    
    logger.info('Case Height: %f, Case Width: %f', parameters.real_case_height, parameters.real_case_width)
    logger.info('Sections In Top: %d', keyboard.get_top_section_count())
    logger.info('Sections In Bottom: %d', keyboard.get_bottom_section_count())


    ############################################################
    # Render SCAD and STL files
    ############################################################
    subprocess_dict = {}

    switch_type_for_filename = ''
    stab_type_for_filename = ''

    for section in solid_object_dict.keys():

        if args.switch_type_in_filename == True:
            switch_type_for_filename = '_' + parameters.switch_type
            stab_type_for_filename = '_' + parameters.stabilizer_type

        section_postfix = ''

        # Creating global items that have no relaton to switch type
        if isinstance(section, str) and section == 'global':
            switch_type_for_filename = ''
            stab_type_for_filename = ''
        
        # If the current object dict section is an int greater than -1 add the section number to the filename
        if isinstance(section, int) and section > -1:
            section_postfix = '_section_%d' % (section)
        
        if args.exploded == True:
            section_postfix = '_exploded'

        for part_name in solid_object_dict[section].keys():
            part_name_formatted = '_' + part_name

            scad_file_name = scad_folder_path / (layout_name + section_postfix + part_name_formatted + switch_type_for_filename + stab_type_for_filename + scad_postfix)
            stl_file_name = stl_folder_path / (layout_name + section_postfix + part_name_formatted + switch_type_for_filename + stab_type_for_filename + stl_postfix)

            if solid_object_dict[section][part_name] is not None:
                logger.info('Generate scad file with name %s', scad_file_name)
                # Generate SCAD file from assembly
                scad_render_to_file(solid_object_dict[section][part_name], scad_file_name, file_header=f'$fn = {FRAGMENTS};')
                print('Generated scad file with name', scad_file_name)
                
                # Render STL if option is chosen
                if args.render:
                    logger.debug('Render STL from SCAD')
                    logger.info('Generate stl file with name %s from %s', stl_file_name, scad_file_name)

                    openscad_command_list = ['openscad', '-o', '%s' % (stl_file_name), '%s' % (scad_file_name)]
                    subprocess_dict[stl_file_name] = subprocess.Popen(openscad_command_list)
    
    
    ################################################################
    #  Wait for render processes to complete
    ################################################################
    if args.render:
        logger.debug(subprocess_dict)
        running = True
        while running == True:
            running = False
            for stl_file_name in subprocess_dict.keys():
                p = subprocess_dict[stl_file_name]
                if p is not None:
                    # running = True
                    rcode = None
                    try:
                        rcode = p.wait(.1)
                    except subprocess.TimeoutExpired as err:
                        running = True
                    if rcode is not None:
                        logger.info('Render Complete: file: %s', stl_file_name)
                        print('Render Complete: file:', stl_file_name)
                        subprocess_dict[stl_file_name] = None
            # time.sleep(1)



    logger.info('Generation Complete')

if __name__ == "__main__":
    main()
 
 
************************************************/
